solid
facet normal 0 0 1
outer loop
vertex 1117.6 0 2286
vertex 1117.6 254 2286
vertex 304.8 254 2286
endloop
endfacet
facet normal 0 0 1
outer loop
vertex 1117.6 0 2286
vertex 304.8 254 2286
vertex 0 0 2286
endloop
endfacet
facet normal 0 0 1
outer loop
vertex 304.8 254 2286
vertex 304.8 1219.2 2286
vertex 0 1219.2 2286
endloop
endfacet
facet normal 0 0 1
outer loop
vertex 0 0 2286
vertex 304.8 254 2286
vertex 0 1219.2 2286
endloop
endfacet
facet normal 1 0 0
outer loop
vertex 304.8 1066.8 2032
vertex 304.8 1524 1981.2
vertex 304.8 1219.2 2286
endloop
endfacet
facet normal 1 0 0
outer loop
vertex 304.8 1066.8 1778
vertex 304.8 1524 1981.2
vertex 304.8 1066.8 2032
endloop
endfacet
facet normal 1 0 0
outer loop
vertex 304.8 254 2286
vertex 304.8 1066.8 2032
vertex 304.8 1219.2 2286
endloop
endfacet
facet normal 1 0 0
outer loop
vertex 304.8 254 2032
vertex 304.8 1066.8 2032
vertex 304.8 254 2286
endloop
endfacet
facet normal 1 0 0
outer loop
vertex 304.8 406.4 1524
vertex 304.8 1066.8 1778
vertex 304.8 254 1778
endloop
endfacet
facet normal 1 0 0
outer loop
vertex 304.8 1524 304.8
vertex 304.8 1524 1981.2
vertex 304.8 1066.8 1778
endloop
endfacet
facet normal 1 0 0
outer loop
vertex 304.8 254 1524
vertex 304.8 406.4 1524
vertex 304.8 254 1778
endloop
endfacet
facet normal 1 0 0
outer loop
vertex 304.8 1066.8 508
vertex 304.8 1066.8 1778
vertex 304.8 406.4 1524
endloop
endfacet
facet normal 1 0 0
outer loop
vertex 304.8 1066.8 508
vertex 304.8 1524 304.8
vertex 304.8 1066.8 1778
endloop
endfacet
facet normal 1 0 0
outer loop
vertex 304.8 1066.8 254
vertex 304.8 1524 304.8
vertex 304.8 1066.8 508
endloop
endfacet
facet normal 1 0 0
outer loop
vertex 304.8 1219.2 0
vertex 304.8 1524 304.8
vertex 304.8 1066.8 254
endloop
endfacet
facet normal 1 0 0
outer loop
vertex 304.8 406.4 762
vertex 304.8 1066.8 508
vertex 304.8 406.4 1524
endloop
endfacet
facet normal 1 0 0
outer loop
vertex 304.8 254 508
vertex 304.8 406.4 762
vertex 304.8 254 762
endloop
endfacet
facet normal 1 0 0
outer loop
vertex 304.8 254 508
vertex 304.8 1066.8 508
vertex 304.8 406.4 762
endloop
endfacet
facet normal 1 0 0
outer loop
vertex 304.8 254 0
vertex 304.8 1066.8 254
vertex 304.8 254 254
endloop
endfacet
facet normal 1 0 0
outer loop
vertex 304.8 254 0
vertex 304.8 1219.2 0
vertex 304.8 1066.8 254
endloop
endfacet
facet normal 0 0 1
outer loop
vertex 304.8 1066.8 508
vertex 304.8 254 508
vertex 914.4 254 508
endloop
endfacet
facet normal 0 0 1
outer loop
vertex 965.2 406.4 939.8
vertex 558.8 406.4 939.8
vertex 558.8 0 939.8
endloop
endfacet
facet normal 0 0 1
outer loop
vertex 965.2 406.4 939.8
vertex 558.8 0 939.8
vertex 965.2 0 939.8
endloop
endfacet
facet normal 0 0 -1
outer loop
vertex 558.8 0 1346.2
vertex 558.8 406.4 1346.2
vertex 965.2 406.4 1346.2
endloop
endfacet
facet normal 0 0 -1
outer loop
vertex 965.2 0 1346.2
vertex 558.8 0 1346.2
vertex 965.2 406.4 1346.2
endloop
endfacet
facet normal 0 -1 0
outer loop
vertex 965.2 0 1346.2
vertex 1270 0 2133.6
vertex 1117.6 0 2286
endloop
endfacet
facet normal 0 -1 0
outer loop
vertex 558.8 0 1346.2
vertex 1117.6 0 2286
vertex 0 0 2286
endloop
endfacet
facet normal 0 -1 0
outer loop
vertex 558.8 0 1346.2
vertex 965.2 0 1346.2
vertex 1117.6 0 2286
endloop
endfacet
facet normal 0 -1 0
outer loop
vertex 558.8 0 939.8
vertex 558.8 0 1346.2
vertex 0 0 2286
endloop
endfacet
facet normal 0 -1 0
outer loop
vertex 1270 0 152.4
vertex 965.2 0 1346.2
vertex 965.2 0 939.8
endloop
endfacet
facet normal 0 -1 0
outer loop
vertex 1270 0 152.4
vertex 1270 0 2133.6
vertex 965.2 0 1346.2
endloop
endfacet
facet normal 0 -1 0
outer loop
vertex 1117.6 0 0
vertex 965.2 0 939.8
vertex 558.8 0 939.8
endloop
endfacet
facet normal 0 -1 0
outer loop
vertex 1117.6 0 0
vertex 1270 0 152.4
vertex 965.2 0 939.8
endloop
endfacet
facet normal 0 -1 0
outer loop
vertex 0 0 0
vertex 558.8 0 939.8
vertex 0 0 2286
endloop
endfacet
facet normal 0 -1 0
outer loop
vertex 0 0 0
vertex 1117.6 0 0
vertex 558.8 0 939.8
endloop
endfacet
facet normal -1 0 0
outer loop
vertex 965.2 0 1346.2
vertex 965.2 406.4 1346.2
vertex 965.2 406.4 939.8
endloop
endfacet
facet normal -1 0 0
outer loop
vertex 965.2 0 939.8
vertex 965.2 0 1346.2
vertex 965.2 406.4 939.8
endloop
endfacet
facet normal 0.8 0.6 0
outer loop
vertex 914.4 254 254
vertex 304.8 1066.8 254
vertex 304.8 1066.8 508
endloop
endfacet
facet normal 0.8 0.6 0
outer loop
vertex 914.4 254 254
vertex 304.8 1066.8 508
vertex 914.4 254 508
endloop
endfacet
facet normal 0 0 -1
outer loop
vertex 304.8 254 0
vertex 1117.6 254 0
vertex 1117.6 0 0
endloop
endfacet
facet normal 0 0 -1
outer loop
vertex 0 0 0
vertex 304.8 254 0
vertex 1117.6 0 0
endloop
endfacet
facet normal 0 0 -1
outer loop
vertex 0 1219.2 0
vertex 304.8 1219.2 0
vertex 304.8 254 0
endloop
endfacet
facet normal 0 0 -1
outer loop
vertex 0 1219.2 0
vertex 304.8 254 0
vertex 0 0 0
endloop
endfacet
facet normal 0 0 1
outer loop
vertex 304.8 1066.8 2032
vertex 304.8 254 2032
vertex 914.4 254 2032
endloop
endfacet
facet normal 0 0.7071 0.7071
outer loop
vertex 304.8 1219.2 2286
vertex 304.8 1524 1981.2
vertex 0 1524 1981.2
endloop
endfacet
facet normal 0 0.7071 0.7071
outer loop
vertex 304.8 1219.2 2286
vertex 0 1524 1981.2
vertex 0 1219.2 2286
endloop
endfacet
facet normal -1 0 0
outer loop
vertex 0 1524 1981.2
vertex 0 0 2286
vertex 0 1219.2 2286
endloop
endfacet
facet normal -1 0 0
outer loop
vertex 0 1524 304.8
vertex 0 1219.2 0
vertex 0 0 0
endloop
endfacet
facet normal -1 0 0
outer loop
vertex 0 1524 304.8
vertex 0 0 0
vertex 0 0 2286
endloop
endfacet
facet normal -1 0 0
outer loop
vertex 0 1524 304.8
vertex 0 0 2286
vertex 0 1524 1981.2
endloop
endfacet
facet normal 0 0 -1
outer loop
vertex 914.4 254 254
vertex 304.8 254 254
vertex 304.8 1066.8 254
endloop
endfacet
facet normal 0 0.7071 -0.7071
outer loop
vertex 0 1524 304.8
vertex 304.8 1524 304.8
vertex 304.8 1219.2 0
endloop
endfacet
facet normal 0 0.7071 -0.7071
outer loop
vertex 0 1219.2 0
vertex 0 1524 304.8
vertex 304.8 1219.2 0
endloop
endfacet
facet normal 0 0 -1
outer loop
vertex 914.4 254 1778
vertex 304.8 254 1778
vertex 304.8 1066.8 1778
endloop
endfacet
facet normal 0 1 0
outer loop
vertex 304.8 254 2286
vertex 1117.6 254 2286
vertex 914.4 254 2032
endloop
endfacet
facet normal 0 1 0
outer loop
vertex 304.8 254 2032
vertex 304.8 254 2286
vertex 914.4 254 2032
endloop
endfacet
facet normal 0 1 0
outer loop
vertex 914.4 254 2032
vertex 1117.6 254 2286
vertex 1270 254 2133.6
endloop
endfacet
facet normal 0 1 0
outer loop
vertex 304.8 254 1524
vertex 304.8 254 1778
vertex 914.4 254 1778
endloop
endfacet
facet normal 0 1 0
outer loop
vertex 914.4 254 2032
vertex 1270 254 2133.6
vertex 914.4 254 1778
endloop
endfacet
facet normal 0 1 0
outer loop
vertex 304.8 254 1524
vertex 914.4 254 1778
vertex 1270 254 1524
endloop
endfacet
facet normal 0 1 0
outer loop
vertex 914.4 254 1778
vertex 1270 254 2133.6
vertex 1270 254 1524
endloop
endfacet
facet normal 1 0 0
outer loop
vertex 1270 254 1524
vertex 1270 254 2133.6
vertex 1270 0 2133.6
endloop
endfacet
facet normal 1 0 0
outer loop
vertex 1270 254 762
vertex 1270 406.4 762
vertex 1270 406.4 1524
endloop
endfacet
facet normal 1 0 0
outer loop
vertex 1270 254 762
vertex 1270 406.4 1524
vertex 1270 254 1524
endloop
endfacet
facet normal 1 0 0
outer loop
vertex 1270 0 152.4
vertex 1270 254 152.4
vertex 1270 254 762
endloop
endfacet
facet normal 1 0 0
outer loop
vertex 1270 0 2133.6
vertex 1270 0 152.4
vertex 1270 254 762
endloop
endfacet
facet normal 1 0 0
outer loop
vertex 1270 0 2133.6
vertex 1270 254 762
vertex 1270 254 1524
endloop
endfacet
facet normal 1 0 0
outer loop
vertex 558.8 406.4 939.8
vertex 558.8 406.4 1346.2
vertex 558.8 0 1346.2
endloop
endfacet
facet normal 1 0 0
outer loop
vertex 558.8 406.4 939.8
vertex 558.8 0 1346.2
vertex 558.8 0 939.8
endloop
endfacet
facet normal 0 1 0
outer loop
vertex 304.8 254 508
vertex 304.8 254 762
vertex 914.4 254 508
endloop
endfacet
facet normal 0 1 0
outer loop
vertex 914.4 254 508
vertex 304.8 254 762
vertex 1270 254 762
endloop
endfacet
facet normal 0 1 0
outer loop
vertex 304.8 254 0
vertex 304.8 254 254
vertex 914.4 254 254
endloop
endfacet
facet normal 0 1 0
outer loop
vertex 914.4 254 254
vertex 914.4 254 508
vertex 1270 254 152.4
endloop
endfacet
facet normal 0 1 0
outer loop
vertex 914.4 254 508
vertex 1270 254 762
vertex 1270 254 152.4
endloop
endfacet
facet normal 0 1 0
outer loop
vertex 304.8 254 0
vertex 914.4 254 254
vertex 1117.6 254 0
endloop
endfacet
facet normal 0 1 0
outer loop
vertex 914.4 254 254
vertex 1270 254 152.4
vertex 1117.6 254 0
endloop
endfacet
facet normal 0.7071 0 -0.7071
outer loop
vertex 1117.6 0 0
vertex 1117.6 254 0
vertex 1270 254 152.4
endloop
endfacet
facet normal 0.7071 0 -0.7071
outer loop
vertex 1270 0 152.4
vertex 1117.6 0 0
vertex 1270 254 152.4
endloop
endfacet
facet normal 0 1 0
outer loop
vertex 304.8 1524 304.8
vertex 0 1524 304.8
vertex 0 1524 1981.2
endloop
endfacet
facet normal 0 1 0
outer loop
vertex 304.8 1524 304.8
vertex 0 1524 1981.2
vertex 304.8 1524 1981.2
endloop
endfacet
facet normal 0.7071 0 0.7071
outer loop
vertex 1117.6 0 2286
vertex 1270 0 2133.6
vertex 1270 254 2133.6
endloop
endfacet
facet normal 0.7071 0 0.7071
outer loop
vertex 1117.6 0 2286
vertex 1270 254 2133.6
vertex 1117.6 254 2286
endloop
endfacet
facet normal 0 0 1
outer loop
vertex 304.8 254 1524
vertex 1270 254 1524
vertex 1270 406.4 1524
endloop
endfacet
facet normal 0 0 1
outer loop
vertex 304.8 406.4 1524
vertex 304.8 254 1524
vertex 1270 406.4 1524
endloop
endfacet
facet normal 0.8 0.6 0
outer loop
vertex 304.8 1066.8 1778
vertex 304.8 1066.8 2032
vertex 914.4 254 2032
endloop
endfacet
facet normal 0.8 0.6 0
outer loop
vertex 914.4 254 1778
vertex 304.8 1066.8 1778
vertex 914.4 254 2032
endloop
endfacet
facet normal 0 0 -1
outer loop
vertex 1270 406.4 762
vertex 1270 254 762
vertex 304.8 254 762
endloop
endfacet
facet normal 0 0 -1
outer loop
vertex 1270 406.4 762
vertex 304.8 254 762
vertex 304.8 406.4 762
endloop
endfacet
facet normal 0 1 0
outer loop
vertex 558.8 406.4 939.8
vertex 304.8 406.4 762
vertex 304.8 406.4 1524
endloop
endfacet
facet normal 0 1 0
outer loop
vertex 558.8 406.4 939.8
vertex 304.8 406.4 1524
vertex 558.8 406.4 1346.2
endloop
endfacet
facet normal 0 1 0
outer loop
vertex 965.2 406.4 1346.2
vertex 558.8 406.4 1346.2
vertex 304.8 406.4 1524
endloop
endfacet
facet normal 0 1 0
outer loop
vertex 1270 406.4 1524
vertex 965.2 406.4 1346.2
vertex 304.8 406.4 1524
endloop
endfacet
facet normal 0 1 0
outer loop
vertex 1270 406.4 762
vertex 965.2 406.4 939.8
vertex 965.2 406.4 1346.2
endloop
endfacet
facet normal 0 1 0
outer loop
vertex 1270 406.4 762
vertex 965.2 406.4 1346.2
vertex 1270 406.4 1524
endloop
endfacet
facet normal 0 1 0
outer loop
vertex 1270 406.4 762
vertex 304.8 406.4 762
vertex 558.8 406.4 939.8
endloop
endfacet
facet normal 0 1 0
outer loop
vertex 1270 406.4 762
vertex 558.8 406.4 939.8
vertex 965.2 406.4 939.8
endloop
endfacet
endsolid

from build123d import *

# Parameters (mm, degrees)
Y_KSEKLIK_EKSTR_ZYON1_DEPTH = 2286
IZIM3_W                     = 762
IZIM3_H                     = 152.4
KES_EKSTR_ZYON4_DEPTH       = 965.2
KES_EKSTR_ZYON5_DEPTH       = 304.8
KES_EKSTR_ZYON6_DEPTH       = 304.8
IZIM11_W                    = 406.4
IZIM11_H                    = 406.4
KES_EKSTR_ZYON7_DEPTH       = 406.4
IZIM12_W                    = 254
IZIM12_H                    = 812.8
Y_KSEKLIK_EKSTR_ZYON3_DEPTH = 609.6
KES_EKSTR_ZYON10_DEPTH      = 254
KES_EKSTR_ZYON11_DEPTH      = 254


with BuildPart() as part:
    # Çizim1 → Yükseklik-Ekstrüzyon1 (new body)
    with BuildSketch(Plane.XY):
        Polygon((0, 1524), (304.8, 1524), (304.8, 406.4), (1270, 406.4), (1270, 0), (0, 0), align=None)
    extrude(amount=Y_KSEKLIK_EKSTR_ZYON1_DEPTH)

    # Çizim3 → Kes-Ekstrüzyon4 (cut)
    with BuildSketch(Plane(origin=(1270, 0, 0), x_dir=(0, 0, -1), z_dir=(1, 0, 0))):
        with Locations((-1905, 330.2)):
            Rectangle(IZIM3_W, IZIM3_H)
        with Locations((-381, 330.2)):
            Rectangle(IZIM3_W, IZIM3_H)
    extrude(amount=-KES_EKSTR_ZYON4_DEPTH, mode=Mode.SUBTRACT)

    # Çizim9 → Kes-Ekstrüzyon5 (cut)
    with BuildSketch(Plane(origin=(304.8, 0, 0), x_dir=(0, 0, -1), z_dir=(1, 0, 0))):
        Polygon((-1981.2, 1524), (-2286, 1219.2), (-2557.798170462, 1490.998170462), (-2252.998170462, 1795.798170462), align=None)
        Polygon((-304.8, 1524), (0, 1219.2), (265.402813466, 1484.602813466), (-39.397186534, 1789.402813466), align=None)
    extrude(amount=-KES_EKSTR_ZYON5_DEPTH, mode=Mode.SUBTRACT)

    # Çizim10 → Kes-Ekstrüzyon6 (cut)
    with BuildSketch(Plane(origin=(0, 254, 0), x_dir=(1, 0, 0), z_dir=(0, 1, 0))):
        Polygon((1117.6, 0), (1270, -152.4), (1478.221993626, 55.821993626), (1325.821993626, 208.221993626), align=None)
        Polygon((1270, -2133.6), (1117.6, -2286), (1313.736223321, -2482.136223321), (1466.136223321, -2329.736223321), align=None)
    extrude(amount=-KES_EKSTR_ZYON6_DEPTH, mode=Mode.SUBTRACT)

    # Çizim11 → Kes-Ekstrüzyon7 (cut)
    with BuildSketch(Plane(origin=(0, 406.4, 0), x_dir=(1, 0, 0), z_dir=(0, 1, 0))):
        with Locations((762, -1143)):
            Rectangle(IZIM11_W, IZIM11_H)
    extrude(amount=-KES_EKSTR_ZYON7_DEPTH, mode=Mode.SUBTRACT)

    # Çizim12 → Yükseklik-Ekstrüzyon3 (add)
    with BuildSketch(Plane(origin=(304.8, 0, 0), x_dir=(0, 0, -1), z_dir=(1, 0, 0))):
        with Locations((-1905, 660.4)):
            Rectangle(IZIM12_W, IZIM12_H)
        with Locations((-381, 660.4)):
            Rectangle(IZIM12_W, IZIM12_H)
    extrude(amount=Y_KSEKLIK_EKSTR_ZYON3_DEPTH)

    # Çizim14 → Kes-Ekstrüzyon10 (cut)
    with BuildSketch(Plane.XY.offset(2032)):
        Polygon((304.8, 1066.8), (914.4, 254), (1378.732090764, 602.249068073), (769.132090764, 1415.049068073), align=None)
    extrude(amount=-KES_EKSTR_ZYON10_DEPTH, mode=Mode.SUBTRACT)

    # Çizim15 → Kes-Ekstrüzyon11 (cut)
    with BuildSketch(Plane(origin=(0, 0, 254), x_dir=(-1, 0, 0), z_dir=(0, 0, -1))):
        Polygon((-304.8, 1066.8), (-914.4, 254), (-1479.518034474, 677.838525855), (-869.918034474, 1490.638525855), align=None)
    extrude(amount=-KES_EKSTR_ZYON11_DEPTH, mode=Mode.SUBTRACT)


solid = part.part
